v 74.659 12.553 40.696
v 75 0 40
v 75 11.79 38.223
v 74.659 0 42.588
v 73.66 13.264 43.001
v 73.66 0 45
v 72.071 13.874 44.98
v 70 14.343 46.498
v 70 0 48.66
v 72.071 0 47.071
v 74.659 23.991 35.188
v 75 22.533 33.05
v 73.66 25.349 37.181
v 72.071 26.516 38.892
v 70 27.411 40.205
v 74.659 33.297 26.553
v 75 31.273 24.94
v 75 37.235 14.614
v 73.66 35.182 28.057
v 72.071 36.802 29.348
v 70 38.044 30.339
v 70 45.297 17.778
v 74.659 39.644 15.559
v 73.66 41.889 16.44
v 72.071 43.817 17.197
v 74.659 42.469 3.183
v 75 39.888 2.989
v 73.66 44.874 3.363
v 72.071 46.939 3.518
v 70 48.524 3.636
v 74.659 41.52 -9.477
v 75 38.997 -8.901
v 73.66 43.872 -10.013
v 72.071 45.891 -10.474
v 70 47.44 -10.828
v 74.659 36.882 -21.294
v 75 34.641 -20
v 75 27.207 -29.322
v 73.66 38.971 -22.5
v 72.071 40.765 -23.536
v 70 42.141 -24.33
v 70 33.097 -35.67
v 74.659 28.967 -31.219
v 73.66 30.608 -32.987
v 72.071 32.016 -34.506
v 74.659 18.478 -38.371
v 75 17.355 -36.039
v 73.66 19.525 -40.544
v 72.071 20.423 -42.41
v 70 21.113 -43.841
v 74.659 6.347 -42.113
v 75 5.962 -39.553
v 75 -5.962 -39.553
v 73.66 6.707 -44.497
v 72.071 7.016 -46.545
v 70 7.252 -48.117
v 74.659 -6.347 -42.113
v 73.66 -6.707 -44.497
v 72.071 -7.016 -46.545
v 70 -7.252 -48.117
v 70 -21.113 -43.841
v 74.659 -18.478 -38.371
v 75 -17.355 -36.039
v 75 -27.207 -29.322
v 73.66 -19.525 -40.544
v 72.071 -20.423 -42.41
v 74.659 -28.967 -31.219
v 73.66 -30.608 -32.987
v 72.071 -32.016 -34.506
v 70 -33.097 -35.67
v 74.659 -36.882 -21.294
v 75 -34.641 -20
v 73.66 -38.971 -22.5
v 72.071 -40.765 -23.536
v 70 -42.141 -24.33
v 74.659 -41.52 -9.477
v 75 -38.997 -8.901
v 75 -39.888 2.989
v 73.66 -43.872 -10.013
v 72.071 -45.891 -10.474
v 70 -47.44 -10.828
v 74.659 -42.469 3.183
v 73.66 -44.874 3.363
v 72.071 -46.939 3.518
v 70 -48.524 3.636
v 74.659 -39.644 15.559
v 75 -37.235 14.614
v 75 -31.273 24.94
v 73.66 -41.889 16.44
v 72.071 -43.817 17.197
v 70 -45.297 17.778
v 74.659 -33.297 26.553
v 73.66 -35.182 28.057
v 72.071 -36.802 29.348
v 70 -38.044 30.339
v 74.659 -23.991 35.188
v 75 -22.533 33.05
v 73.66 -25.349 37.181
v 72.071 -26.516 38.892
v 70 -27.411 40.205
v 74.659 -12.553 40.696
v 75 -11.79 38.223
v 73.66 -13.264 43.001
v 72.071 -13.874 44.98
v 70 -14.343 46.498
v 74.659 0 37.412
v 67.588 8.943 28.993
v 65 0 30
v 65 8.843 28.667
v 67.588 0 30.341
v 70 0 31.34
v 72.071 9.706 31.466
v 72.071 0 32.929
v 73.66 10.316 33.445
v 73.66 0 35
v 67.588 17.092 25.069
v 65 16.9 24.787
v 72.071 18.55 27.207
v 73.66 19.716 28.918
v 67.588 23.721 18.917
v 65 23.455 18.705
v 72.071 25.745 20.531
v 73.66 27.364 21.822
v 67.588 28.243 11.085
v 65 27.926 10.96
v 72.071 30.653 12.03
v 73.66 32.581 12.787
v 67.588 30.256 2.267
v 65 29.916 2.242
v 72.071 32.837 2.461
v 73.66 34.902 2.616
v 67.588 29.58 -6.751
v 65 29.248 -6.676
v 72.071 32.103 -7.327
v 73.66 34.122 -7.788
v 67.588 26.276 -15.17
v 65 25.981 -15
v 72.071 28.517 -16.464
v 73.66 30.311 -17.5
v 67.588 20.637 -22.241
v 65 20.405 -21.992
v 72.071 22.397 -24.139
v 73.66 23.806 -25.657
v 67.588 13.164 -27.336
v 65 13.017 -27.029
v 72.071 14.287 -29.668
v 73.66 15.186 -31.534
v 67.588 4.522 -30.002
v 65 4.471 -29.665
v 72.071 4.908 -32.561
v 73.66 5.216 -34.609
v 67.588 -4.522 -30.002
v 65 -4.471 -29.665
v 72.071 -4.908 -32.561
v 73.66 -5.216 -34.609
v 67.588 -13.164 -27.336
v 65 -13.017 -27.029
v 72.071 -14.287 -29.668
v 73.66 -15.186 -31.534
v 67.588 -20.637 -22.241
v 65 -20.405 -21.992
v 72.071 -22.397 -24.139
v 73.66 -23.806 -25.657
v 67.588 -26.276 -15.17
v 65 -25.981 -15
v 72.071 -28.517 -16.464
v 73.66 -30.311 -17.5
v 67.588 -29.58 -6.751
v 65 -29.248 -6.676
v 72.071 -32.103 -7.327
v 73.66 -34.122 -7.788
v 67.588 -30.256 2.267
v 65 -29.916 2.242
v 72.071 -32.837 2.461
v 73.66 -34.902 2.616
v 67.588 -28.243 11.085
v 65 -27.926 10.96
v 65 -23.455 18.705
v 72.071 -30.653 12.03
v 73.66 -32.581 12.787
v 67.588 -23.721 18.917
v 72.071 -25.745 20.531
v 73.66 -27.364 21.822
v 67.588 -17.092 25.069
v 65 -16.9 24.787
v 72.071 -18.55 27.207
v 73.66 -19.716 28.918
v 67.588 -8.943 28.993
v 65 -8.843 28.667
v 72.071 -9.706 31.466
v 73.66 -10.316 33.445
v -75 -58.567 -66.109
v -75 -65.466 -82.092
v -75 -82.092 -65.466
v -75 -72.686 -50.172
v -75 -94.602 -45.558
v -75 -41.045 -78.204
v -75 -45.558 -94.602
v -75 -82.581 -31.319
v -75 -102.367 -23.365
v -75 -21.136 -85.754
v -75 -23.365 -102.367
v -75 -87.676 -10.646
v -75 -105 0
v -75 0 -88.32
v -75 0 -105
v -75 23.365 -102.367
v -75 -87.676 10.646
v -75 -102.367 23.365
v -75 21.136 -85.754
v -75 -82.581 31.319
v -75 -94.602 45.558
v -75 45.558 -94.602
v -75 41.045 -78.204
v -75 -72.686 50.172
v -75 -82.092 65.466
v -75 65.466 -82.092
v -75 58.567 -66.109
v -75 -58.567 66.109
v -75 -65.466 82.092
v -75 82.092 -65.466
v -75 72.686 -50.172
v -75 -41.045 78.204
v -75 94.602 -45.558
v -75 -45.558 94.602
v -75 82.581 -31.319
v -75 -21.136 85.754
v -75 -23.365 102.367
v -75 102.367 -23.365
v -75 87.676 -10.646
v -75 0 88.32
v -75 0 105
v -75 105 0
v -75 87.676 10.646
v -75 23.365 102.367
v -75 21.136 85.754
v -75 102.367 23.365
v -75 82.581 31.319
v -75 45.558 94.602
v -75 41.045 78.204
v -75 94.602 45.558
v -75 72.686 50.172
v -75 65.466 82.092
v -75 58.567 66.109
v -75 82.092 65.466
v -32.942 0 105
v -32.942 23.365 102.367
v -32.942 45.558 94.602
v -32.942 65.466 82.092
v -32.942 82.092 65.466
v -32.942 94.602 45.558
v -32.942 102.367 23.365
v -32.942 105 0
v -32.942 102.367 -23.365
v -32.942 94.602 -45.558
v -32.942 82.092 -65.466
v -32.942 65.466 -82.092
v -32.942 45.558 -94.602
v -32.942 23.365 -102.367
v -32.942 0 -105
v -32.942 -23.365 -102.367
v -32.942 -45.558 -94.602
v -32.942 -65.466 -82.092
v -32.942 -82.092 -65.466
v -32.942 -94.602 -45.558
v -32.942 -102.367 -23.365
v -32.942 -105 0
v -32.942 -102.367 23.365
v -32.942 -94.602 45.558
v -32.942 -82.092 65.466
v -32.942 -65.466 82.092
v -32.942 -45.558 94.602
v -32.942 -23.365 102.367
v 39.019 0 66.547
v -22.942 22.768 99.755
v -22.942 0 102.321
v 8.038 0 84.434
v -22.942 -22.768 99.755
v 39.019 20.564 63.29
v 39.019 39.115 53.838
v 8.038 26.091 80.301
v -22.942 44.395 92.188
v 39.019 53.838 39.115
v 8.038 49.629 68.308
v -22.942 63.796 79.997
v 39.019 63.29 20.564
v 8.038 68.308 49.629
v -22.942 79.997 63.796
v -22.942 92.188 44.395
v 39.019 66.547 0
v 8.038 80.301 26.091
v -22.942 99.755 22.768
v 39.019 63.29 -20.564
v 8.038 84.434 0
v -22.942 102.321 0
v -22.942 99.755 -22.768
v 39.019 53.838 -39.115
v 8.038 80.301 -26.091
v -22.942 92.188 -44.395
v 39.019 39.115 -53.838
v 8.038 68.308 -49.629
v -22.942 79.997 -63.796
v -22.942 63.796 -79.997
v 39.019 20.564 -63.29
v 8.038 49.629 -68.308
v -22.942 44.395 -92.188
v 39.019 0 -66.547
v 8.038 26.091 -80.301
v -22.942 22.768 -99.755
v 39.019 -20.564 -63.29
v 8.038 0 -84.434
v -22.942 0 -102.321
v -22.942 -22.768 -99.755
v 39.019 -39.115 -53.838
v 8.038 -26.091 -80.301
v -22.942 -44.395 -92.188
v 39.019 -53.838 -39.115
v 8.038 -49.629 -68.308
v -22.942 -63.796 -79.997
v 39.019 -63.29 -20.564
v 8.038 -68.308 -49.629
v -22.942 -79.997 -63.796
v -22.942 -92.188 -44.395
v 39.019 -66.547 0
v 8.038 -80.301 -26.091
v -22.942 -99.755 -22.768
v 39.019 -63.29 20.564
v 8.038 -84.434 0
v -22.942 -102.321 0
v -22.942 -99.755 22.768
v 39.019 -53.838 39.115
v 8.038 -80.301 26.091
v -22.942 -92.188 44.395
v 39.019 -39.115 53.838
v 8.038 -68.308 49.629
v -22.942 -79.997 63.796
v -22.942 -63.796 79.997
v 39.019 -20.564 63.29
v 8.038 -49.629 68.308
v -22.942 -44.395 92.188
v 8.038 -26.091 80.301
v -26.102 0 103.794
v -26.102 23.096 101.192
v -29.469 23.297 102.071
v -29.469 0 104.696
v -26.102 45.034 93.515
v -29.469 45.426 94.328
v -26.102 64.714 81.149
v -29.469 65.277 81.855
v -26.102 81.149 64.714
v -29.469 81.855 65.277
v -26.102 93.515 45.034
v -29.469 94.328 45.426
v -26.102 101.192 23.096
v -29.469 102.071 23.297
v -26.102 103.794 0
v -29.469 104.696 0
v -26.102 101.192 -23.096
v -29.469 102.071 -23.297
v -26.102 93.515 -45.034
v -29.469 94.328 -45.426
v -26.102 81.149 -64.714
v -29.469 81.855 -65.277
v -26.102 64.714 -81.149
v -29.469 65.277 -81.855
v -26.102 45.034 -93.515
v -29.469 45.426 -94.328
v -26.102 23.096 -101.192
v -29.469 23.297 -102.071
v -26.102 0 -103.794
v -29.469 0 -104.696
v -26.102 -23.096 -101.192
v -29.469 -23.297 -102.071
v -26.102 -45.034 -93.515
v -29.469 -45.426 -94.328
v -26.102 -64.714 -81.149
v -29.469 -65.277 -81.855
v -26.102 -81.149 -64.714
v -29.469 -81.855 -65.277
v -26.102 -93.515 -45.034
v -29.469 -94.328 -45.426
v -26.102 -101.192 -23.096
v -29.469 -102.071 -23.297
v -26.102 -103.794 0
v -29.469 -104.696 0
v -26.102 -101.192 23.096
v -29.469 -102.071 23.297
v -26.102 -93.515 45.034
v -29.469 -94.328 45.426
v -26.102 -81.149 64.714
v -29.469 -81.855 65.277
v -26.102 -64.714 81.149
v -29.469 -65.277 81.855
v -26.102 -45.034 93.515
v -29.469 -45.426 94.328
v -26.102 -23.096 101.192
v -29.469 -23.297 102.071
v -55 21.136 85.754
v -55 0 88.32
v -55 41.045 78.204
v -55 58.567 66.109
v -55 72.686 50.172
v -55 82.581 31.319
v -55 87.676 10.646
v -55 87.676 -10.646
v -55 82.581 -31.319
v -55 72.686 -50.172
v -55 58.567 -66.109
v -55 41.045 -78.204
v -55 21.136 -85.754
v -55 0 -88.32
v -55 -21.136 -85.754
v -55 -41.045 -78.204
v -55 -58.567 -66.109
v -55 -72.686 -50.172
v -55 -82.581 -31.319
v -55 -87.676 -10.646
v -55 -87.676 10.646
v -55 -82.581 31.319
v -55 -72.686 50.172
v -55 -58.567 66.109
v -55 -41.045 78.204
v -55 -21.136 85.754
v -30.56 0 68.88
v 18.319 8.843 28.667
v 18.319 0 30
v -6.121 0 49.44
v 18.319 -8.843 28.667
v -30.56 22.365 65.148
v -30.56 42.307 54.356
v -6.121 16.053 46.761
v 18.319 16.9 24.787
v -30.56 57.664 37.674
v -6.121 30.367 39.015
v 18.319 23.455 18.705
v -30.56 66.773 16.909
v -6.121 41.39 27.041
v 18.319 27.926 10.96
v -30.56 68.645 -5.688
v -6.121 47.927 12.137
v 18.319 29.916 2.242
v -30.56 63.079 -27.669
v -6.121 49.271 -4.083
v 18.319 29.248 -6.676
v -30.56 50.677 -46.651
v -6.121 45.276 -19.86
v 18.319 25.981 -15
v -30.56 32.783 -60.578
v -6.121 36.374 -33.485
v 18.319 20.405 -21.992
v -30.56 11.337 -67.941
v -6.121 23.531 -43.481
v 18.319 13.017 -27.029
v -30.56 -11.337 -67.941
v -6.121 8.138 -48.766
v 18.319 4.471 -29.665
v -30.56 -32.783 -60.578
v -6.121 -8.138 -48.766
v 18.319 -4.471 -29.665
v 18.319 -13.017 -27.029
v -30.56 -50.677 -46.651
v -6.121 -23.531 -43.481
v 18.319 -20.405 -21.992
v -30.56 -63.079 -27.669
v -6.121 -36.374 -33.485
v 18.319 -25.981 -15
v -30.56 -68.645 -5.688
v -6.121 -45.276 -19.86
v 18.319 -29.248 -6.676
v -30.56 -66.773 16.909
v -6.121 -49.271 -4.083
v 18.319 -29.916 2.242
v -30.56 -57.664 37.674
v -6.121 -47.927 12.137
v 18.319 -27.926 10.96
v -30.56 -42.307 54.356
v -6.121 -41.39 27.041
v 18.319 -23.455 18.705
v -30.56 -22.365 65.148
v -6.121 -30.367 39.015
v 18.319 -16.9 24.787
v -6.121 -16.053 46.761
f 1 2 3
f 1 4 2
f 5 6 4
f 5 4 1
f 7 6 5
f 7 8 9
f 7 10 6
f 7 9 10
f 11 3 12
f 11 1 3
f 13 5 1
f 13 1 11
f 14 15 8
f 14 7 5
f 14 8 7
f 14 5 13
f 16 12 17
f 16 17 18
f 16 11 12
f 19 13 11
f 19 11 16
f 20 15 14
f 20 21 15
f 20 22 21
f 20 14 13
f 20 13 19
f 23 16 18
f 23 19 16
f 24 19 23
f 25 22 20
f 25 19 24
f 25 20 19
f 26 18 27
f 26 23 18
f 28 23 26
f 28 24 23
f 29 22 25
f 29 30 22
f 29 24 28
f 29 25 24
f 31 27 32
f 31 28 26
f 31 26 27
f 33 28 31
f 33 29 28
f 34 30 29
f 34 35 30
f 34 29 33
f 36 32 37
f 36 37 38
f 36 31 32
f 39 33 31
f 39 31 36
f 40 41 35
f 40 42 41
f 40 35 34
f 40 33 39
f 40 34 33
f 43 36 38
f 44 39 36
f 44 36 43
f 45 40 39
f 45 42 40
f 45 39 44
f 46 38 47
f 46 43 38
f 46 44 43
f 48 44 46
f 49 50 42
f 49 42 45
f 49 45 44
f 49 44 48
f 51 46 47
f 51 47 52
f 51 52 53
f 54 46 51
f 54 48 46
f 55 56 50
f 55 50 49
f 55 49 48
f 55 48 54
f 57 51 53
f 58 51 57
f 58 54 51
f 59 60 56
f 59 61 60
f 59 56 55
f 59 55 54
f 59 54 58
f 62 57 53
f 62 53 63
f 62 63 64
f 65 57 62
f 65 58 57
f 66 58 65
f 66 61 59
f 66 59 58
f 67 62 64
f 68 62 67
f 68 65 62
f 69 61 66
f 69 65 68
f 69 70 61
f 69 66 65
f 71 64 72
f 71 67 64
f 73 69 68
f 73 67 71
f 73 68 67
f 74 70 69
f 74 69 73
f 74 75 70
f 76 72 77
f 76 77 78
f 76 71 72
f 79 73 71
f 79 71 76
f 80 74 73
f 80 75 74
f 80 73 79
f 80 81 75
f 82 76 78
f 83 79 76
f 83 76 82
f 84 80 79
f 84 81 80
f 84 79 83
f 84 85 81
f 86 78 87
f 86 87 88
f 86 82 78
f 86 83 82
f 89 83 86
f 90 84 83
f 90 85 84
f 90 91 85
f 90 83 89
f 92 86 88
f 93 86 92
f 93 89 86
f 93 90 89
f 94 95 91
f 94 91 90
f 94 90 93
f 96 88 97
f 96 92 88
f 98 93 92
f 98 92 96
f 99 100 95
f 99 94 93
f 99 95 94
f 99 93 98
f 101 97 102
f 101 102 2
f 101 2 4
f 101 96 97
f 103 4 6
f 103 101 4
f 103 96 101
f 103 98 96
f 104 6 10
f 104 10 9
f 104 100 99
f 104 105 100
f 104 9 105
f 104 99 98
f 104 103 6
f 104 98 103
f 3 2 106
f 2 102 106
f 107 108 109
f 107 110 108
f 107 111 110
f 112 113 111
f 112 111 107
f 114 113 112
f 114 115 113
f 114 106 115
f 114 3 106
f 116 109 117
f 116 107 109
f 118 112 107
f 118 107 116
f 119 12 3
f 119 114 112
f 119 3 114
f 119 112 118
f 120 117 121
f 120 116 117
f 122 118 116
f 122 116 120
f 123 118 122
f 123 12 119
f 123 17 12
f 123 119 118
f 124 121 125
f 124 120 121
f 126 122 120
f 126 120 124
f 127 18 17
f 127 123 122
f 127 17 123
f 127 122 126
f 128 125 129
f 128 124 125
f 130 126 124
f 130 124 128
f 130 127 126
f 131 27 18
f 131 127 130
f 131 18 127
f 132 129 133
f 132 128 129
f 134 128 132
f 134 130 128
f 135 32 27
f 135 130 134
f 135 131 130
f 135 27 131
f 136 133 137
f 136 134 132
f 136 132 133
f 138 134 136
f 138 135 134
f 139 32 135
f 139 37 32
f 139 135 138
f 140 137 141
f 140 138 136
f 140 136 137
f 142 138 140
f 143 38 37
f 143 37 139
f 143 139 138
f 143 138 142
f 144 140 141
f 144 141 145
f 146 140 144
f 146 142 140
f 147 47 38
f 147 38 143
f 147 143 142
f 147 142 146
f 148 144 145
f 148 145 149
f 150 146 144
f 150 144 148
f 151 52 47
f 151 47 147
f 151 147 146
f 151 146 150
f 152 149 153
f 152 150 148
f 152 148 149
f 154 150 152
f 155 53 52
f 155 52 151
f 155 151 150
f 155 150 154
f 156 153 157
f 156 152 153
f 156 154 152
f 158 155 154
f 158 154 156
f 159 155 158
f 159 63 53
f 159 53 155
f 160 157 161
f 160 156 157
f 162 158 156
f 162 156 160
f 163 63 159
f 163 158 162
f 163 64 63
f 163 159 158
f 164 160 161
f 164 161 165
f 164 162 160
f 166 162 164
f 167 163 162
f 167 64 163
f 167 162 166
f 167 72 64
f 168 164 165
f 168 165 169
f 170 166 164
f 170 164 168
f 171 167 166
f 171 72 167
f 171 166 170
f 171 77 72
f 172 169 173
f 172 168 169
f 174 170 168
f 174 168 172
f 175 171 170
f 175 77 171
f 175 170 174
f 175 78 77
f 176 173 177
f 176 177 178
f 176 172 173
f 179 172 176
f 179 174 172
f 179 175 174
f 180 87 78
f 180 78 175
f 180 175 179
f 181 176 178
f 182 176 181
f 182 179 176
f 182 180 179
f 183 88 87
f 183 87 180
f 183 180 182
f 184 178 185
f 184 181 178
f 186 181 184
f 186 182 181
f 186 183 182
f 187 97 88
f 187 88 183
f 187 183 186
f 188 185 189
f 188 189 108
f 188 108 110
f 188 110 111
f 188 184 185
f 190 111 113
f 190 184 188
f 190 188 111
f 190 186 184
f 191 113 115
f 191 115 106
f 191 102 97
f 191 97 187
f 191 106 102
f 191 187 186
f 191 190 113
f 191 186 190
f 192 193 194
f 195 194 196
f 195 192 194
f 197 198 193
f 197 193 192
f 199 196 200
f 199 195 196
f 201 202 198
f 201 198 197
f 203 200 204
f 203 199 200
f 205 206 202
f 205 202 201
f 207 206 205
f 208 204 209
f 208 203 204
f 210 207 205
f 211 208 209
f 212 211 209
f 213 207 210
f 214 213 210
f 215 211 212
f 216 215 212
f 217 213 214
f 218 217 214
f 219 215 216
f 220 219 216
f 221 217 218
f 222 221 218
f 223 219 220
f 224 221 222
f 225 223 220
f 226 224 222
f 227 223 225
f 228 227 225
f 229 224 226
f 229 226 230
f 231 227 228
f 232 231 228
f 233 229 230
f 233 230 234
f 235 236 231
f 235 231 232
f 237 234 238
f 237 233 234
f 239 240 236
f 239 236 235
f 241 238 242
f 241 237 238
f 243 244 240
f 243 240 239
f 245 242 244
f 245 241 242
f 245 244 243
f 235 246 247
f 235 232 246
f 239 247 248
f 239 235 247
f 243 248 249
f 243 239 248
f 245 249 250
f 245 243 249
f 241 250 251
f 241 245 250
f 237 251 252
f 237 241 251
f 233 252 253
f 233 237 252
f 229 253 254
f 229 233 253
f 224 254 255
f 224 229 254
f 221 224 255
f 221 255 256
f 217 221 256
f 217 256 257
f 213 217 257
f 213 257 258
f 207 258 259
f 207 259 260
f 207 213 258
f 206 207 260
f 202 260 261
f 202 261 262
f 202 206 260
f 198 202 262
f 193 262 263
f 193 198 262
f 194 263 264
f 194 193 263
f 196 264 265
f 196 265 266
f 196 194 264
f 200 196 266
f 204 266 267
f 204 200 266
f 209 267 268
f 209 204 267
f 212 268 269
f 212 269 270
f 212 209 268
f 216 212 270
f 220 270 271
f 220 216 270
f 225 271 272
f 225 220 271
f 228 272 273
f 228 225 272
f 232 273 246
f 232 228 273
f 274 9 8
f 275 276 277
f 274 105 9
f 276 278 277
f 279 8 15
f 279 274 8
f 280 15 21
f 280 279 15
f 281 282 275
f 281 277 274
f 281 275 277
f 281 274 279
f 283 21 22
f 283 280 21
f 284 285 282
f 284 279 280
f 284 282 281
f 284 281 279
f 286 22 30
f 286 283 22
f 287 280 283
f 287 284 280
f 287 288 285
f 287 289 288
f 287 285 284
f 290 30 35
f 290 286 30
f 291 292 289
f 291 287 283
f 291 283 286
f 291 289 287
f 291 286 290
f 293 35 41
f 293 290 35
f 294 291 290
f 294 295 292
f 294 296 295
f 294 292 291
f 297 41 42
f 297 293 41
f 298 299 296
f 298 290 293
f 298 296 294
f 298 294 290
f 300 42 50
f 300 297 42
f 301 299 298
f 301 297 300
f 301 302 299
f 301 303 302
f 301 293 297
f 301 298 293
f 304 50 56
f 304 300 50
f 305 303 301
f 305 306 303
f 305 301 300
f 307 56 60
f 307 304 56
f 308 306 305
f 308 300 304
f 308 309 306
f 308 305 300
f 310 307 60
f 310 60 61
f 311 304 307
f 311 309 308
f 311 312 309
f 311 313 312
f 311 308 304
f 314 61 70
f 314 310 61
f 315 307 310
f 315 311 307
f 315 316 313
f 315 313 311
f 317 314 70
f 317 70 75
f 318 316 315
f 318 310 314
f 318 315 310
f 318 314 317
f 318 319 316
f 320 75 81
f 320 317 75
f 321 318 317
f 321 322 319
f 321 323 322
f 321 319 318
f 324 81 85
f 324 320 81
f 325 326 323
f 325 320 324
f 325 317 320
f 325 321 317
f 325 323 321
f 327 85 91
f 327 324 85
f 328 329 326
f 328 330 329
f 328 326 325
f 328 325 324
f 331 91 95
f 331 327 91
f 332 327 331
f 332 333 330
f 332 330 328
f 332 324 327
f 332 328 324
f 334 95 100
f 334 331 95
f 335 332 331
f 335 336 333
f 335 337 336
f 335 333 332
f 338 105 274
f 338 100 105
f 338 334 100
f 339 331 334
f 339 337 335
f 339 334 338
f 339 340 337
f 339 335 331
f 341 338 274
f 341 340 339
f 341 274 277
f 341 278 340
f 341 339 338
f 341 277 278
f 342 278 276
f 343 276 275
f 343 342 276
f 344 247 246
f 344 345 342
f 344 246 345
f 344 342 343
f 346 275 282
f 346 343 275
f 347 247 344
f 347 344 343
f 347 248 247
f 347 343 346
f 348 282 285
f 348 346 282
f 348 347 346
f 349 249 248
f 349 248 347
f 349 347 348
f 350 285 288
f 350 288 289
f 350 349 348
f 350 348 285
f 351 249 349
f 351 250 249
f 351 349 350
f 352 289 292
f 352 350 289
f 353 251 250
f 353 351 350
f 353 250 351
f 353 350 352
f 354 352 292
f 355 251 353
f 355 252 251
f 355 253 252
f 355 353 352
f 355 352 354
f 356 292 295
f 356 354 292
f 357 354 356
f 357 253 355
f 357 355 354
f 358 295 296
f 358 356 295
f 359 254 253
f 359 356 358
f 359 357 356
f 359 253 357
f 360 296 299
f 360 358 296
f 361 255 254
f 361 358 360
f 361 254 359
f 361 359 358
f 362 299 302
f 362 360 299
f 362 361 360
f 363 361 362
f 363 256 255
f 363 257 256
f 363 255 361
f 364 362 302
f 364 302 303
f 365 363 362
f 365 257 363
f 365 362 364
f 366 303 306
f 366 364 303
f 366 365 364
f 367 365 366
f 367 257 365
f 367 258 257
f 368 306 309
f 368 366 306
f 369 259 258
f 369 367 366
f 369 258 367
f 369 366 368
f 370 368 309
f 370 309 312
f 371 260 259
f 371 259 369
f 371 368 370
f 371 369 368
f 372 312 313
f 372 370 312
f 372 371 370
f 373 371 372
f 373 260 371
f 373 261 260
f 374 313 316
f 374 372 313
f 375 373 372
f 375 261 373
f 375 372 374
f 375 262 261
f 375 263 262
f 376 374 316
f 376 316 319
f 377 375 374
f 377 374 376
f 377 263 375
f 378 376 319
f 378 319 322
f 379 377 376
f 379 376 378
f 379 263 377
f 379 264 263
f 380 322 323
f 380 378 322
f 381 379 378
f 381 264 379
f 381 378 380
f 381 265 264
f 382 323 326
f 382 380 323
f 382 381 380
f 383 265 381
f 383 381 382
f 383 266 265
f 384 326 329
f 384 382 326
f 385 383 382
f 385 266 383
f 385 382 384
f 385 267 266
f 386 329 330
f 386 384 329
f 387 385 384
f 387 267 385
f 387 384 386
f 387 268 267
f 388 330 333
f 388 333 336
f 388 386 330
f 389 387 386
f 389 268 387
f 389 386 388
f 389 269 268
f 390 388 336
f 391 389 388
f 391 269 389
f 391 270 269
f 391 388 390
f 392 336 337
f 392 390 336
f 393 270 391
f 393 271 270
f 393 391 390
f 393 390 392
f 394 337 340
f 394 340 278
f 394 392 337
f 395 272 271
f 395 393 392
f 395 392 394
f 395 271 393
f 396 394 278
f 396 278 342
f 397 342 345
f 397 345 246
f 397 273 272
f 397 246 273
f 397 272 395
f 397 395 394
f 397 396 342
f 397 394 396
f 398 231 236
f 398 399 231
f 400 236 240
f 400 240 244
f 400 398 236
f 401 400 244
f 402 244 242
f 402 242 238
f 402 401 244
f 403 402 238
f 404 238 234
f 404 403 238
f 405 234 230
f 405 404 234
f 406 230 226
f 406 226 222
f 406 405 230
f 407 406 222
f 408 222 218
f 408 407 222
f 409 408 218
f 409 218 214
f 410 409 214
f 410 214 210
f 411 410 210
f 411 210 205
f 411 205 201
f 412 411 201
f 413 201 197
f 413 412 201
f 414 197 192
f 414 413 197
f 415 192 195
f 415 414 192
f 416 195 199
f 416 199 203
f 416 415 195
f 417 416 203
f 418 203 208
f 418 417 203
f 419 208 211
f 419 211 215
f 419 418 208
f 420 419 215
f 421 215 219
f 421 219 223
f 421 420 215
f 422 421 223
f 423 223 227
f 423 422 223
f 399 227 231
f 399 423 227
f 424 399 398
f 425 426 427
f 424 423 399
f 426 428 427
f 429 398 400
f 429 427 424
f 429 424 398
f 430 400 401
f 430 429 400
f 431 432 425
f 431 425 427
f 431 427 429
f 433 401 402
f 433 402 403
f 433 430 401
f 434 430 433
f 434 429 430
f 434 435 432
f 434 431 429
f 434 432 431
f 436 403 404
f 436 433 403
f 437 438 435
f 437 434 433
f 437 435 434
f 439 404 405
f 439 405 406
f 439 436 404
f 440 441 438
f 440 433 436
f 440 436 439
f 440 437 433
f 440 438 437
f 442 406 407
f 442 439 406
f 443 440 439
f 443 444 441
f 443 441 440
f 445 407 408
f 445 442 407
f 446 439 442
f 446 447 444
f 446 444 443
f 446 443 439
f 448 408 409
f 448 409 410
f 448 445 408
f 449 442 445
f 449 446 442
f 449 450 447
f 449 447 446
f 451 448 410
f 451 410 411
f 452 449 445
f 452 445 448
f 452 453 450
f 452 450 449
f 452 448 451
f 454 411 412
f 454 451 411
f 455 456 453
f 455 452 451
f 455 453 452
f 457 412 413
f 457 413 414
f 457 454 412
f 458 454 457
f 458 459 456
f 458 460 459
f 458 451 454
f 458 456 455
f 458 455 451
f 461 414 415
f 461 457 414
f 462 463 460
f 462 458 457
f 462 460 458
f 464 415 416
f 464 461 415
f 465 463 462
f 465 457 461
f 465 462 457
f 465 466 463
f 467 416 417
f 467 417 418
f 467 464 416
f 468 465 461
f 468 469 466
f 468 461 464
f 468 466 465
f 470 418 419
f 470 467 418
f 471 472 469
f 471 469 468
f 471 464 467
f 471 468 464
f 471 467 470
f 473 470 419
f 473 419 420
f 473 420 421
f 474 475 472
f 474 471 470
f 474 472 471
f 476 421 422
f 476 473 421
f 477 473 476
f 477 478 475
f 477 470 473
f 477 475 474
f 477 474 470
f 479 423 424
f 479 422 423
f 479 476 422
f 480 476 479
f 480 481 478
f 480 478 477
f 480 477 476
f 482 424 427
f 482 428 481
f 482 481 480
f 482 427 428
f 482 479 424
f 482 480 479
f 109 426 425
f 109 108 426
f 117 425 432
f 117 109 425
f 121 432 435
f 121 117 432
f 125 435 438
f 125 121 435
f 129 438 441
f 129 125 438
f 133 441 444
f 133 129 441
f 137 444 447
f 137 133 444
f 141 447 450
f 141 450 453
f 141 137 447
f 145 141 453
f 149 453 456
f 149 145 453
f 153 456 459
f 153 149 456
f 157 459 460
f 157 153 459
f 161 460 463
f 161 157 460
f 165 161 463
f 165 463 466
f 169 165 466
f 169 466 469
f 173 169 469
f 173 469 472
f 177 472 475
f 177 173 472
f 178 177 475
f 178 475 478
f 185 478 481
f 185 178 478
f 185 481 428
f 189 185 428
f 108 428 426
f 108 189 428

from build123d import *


with BuildPart() as f1:
    # F0 (on Front) → F1 (revolve)
    with BuildSketch(Plane.XZ):
        with BuildLine():
            Line((-32.942286, 105), (-75, 105))
            Line((-75, 105), (-75, 88.320389))
            Line((-75, 88.320389), (-55, 88.320389))
            Line((-55, 88.320389), (18.318778, 30))
            Line((18.318778, 30), (65, 30))
            ThreePointArc((65, 30), (72.071068, 32.928932), (75, 40))
            ThreePointArc((75, 40), (73.660254, 45), (70, 48.660254))
            Line((70, 48.660254), (-22.942286, 102.320508))
            ThreePointArc((-22.942286, 102.320508), (-27.765905, 104.318517), (-32.942286, 105))
        make_face()
    revolve(axis=Axis((-37.41489, 0, 0), (-1, 0, 0)))


solid = f1.part
